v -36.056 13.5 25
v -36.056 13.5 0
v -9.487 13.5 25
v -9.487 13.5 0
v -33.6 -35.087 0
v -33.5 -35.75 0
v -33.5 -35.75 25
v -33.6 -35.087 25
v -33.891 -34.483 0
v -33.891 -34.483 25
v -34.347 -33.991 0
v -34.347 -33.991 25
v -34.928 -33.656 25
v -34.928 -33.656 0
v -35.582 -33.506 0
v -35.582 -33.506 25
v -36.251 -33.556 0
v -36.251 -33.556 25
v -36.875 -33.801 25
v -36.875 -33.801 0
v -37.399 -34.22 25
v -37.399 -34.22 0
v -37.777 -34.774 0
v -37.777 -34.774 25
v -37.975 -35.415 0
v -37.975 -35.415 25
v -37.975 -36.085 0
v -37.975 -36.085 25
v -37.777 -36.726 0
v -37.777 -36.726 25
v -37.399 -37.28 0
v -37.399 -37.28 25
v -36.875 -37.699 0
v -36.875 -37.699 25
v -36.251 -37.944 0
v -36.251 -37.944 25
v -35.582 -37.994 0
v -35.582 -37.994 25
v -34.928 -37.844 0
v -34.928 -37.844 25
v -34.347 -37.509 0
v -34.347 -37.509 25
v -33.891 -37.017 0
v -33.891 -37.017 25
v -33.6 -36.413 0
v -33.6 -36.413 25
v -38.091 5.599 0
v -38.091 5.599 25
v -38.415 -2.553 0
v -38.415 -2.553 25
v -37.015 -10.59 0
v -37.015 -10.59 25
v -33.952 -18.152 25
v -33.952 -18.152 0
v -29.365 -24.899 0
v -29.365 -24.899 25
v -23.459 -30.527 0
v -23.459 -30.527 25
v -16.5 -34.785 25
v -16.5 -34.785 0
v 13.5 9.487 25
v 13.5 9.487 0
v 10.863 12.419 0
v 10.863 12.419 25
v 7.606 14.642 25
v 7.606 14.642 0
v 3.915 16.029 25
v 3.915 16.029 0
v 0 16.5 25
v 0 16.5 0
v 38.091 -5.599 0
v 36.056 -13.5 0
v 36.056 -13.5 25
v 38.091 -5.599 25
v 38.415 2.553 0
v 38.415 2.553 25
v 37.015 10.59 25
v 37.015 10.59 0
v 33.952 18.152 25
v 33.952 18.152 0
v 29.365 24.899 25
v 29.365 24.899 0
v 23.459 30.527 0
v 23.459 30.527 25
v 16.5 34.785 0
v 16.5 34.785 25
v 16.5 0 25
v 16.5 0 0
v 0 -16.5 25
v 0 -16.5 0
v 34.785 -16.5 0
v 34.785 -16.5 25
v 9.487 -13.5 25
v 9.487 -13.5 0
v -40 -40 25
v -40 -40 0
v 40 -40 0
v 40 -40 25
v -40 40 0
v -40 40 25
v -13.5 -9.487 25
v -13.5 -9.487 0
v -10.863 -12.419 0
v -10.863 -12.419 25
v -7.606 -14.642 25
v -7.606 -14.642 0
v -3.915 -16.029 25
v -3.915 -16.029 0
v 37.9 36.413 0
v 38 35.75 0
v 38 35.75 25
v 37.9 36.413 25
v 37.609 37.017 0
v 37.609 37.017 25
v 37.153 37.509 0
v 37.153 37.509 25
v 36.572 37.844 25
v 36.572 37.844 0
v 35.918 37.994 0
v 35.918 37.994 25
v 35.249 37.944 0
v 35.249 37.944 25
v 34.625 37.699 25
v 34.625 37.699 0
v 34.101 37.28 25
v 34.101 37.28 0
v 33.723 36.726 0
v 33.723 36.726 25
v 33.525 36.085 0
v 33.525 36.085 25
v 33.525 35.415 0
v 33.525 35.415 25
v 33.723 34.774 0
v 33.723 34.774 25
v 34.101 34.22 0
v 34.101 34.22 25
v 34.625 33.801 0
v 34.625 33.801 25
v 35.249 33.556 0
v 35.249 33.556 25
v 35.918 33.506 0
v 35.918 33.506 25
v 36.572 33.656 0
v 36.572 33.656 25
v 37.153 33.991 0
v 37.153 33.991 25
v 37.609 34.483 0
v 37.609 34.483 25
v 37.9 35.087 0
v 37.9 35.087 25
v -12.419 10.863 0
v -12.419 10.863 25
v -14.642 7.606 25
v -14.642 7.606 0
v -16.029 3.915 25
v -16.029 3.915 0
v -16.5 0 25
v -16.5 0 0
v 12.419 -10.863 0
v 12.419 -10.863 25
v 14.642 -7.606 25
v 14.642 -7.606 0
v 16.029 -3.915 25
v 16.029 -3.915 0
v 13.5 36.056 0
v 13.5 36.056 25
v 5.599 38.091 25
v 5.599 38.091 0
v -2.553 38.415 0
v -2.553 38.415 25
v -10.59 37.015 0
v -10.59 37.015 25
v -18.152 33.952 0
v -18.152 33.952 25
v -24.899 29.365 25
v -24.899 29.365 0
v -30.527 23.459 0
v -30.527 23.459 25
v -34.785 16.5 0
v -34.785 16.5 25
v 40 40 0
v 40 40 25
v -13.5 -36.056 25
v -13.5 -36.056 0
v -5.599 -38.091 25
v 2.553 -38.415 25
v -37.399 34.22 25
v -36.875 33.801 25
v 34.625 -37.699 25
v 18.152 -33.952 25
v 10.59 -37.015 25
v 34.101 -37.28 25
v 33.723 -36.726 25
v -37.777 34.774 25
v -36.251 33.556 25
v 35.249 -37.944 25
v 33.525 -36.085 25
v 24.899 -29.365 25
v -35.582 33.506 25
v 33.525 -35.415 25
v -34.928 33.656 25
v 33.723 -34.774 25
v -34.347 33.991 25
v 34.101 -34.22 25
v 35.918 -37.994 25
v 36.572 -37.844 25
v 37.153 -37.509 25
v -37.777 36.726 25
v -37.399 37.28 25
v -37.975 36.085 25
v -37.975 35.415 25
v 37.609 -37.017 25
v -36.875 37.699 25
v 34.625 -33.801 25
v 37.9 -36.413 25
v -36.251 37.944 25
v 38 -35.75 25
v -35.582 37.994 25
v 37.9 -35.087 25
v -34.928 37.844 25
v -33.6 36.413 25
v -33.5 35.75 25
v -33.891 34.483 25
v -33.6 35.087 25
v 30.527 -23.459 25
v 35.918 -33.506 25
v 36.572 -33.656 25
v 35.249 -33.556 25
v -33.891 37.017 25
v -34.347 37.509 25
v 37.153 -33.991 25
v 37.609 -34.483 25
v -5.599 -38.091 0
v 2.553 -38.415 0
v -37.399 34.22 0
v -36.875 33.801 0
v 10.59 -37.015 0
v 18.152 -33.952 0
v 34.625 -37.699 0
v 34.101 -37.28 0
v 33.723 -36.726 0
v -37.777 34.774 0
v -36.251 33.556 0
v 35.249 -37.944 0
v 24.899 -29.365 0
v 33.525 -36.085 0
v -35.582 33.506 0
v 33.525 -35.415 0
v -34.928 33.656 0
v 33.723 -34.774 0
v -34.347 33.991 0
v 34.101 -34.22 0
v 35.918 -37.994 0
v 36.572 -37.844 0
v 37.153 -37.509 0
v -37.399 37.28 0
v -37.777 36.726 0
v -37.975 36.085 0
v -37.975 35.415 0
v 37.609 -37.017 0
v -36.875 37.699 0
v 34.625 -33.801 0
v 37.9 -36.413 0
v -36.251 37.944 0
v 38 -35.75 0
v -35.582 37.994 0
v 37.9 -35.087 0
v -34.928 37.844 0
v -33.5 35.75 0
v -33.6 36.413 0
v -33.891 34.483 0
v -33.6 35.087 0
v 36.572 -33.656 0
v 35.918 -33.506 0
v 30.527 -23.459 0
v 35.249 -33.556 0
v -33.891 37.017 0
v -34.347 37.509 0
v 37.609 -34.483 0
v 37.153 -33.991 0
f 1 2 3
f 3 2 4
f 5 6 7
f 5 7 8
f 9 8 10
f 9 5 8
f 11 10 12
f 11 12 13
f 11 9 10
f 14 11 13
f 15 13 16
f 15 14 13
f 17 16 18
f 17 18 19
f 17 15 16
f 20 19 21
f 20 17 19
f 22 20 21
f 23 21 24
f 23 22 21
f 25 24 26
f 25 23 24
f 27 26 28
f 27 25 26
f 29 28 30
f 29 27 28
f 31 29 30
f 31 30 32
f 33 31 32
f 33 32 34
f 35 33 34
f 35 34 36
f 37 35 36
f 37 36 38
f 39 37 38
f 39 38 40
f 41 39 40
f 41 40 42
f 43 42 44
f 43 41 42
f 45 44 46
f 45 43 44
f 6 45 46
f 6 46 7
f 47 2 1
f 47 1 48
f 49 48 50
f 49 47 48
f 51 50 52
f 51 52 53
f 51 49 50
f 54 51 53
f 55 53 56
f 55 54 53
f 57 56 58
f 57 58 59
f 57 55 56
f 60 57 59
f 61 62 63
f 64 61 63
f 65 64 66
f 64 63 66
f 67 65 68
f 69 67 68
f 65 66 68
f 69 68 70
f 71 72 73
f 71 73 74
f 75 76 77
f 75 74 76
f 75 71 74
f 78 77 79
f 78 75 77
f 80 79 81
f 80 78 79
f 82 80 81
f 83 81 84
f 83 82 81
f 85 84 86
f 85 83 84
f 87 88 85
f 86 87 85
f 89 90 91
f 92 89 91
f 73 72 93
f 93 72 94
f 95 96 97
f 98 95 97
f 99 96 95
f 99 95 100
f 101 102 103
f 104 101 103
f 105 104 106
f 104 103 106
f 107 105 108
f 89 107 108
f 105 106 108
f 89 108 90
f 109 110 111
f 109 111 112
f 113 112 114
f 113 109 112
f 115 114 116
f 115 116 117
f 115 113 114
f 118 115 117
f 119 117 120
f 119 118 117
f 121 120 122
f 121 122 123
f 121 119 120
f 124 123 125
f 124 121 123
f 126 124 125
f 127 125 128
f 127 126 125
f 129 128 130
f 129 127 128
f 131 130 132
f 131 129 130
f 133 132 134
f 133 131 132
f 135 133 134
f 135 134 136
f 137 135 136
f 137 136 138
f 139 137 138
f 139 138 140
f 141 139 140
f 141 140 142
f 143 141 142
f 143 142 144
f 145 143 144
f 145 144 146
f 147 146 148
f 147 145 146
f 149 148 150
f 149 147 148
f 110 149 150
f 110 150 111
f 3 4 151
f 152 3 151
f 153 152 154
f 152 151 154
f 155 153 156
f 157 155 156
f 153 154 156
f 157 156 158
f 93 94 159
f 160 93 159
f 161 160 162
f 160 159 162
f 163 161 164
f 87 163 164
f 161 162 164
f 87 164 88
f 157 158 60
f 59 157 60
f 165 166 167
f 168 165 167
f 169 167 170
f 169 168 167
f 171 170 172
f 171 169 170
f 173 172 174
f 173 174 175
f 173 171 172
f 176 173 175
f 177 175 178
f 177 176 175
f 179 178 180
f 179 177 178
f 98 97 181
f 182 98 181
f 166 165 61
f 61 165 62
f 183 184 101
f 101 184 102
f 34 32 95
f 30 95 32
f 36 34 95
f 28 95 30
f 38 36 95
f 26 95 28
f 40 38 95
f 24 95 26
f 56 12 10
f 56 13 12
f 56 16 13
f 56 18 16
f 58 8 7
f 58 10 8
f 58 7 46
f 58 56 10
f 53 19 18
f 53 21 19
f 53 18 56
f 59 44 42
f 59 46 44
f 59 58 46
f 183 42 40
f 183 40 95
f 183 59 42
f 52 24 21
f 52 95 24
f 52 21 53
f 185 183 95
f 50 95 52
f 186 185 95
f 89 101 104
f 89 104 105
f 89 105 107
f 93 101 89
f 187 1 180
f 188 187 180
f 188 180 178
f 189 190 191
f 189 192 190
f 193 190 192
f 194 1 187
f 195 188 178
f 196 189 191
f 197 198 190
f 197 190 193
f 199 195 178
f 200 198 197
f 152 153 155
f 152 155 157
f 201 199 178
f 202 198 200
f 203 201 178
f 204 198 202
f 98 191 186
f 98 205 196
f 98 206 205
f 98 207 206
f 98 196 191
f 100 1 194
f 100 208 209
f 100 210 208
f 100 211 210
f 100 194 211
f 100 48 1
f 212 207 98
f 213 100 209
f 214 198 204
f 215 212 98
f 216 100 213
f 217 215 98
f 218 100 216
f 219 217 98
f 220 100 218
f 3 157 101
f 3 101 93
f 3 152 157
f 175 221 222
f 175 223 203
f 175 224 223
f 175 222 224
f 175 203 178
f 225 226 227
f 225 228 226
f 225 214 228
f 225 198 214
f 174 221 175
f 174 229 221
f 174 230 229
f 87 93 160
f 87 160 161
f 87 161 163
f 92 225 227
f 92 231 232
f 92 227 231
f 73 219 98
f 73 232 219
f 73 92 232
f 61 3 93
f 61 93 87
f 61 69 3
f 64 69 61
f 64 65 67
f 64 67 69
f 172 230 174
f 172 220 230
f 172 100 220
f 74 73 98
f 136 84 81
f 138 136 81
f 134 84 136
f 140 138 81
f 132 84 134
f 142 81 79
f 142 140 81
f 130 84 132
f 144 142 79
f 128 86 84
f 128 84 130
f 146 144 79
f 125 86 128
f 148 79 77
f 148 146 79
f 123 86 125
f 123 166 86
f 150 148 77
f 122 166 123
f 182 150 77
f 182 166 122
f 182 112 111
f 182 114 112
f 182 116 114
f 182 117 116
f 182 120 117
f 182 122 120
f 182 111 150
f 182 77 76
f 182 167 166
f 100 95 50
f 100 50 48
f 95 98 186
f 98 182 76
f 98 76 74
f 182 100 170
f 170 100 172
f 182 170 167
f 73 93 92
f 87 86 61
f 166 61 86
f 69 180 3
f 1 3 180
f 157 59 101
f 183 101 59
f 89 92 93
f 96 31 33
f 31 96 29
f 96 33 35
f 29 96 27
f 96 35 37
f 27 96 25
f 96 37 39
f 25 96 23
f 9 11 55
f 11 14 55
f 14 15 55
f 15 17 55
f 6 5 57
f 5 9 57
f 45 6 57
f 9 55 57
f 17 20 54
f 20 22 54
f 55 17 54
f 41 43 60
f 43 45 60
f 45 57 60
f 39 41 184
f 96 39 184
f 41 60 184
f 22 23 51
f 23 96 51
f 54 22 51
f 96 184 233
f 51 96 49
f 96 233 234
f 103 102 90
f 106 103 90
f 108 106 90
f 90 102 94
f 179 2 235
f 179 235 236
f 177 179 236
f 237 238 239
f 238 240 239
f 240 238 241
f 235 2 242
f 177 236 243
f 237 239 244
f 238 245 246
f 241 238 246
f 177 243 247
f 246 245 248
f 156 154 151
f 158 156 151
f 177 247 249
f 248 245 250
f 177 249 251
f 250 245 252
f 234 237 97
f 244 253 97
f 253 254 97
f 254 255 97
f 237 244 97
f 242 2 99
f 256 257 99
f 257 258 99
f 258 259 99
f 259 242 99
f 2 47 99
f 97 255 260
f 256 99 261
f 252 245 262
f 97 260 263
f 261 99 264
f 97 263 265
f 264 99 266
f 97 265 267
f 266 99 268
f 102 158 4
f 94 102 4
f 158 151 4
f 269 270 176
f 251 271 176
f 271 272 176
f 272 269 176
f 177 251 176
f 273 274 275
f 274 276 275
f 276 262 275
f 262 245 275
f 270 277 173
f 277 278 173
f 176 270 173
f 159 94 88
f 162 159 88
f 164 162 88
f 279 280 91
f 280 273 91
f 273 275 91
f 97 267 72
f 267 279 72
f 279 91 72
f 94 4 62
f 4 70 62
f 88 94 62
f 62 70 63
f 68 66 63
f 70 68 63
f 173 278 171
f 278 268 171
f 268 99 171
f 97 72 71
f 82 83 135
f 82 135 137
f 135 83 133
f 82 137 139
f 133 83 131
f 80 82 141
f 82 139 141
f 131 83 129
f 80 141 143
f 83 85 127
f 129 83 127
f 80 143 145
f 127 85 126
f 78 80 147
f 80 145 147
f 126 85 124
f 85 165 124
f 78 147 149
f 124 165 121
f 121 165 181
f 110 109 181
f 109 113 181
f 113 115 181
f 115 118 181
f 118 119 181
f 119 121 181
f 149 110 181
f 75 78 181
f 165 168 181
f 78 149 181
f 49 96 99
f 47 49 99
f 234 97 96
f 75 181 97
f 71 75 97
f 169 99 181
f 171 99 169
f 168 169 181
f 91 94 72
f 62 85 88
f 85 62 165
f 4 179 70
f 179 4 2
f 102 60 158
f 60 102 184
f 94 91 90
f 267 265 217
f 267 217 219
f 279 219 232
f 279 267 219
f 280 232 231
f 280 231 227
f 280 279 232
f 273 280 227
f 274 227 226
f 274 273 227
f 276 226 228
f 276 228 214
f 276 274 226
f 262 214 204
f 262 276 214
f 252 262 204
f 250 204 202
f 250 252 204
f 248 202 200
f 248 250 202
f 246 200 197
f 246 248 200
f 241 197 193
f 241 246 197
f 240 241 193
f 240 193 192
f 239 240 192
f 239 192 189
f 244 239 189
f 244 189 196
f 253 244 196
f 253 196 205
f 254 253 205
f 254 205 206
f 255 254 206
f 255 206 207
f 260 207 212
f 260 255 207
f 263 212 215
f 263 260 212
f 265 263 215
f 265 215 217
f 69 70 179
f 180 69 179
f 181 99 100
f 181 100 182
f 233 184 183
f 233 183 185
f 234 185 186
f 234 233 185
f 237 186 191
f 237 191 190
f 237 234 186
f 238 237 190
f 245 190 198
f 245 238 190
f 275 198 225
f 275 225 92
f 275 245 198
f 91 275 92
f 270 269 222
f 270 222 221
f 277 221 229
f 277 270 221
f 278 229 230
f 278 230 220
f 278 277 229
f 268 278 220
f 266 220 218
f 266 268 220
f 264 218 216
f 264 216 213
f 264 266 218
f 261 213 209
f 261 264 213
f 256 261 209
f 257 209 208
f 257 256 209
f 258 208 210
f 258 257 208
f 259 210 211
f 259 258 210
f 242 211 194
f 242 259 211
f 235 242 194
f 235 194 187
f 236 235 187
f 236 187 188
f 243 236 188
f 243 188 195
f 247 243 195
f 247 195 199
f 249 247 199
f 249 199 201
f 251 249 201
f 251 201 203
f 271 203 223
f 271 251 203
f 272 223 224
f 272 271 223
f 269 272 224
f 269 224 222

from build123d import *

# Parameters (mm, degrees)
F0_W     = 80
F0_H     = 80
F0_R     = 2.25
F0_R_2   = 38.5
F1_DEPTH = 25
F3_DEPTH = 25


with BuildPart() as f1:
    # F0 (on Top) → F1 (new body)
    with BuildSketch(Plane.XY):
        Rectangle(F0_W, F0_H)
        with Locations((-35.75, -35.75)):
            Circle(F0_R, mode=Mode.SUBTRACT)
        with Locations((35.75, -35.75)):
            Circle(F0_R, mode=Mode.SUBTRACT)
        with Locations((-35.75, 35.75)):
            Circle(F0_R, mode=Mode.SUBTRACT)
        Circle(F0_R_2, mode=Mode.SUBTRACT)
        with Locations((35.75, 35.75)):
            Circle(F0_R, mode=Mode.SUBTRACT)
    extrude(amount=F1_DEPTH)

    # F2 (on Top) → F3 (join)
    with BuildSketch(Plane.XY):
        with BuildLine():
            ThreePointArc((9.4868329805, -13.5), (14.6421095505, -7.6064859108), (16.5, 0))
            Line((16.5, 0), (13.5, 0))
            Line((13.5, 0), (13.5, 9.4868329805))
            ThreePointArc((13.5, 9.4868329805), (7.6064859108, 14.6421095505), (0, 16.5))
            Line((0, 16.5), (0, 13.5))
            Line((0, 13.5), (-9.4868329805, 13.5))
            ThreePointArc((-9.4868329805, 13.5), (-14.6421095505, 7.6064859108), (-16.5, 0))
            Line((-16.5, 0), (-13.5, 0))
            Line((-13.5, 0), (-13.5, -9.4868329805))
            ThreePointArc((-13.5, -9.4868329805), (-7.6064859108, -14.6421095505), (0, -16.5))
            Line((0, -16.5), (0, -13.5))
            Line((0, -13.5), (9.4868329805, -13.5))
        make_face()
        with BuildLine():
            ThreePointArc((13.5, 9.4868329805), (15.7321327226, 4.9749371855), (16.5, 0))
            Line((16.5, 0), (16.5, 34.7850542619))
            ThreePointArc((16.5, 34.7850542619), (15.0134445147, 35.452030743), (13.5, 36.0555127546))
            Line((13.5, 36.0555127546), (13.5, 9.4868329805))
        make_face()
        with BuildLine():
            Line((13.5, 0), (16.5, 0))
            ThreePointArc((16.5, 0), (15.7321327226, 4.9749371855), (13.5, 9.4868329805))
            Line((13.5, 9.4868329805), (13.5, 0))
        make_face()
        with BuildLine():
            Line((0, 13.5), (0, 16.5))
            ThreePointArc((0, 16.5), (-4.9749371855, 15.7321327226), (-9.4868329805, 13.5))
            Line((-9.4868329805, 13.5), (0, 13.5))
        make_face()
        with BuildLine():
            ThreePointArc((-9.4868329805, 13.5), (-4.9749371855, 15.7321327226), (0, 16.5))
            Line((0, 16.5), (-34.7850542619, 16.5))
            ThreePointArc((-34.7850542619, 16.5), (-35.452030743, 15.0134445147), (-36.0555127546, 13.5))
            Line((-36.0555127546, 13.5), (-9.4868329805, 13.5))
        make_face()
        with BuildLine():
            ThreePointArc((-16.5, 0), (-15.7321327226, -4.9749371855), (-13.5, -9.4868329805))
            Line((-13.5, -9.4868329805), (-13.5, 0))
            Line((-13.5, 0), (-16.5, 0))
        make_face()
        with BuildLine():
            Line((-13.5, -36.0555127546), (-13.5, -9.4868329805))
            ThreePointArc((-13.5, -9.4868329805), (-15.7321327226, -4.9749371855), (-16.5, 0))
            Line((-16.5, 0), (-16.5, -34.7850542619))
            ThreePointArc((-16.5, -34.7850542619), (-15.0134445147, -35.452030743), (-13.5, -36.0555127546))
        make_face()
        with BuildLine():
            ThreePointArc((0, -16.5), (4.9749371855, -15.7321327226), (9.4868329805, -13.5))
            Line((9.4868329805, -13.5), (0, -13.5))
            Line((0, -13.5), (0, -16.5))
        make_face()
        with BuildLine():
            Line((36.0555127546, -13.5), (9.4868329805, -13.5))
            ThreePointArc((9.4868329805, -13.5), (4.9749371855, -15.7321327226), (0, -16.5))
            Line((0, -16.5), (34.7850542619, -16.5))
            ThreePointArc((34.7850542619, -16.5), (35.452030743, -15.0134445147), (36.0555127546, -13.5))
        make_face()
    extrude(amount=F3_DEPTH)


solid = f1.part
